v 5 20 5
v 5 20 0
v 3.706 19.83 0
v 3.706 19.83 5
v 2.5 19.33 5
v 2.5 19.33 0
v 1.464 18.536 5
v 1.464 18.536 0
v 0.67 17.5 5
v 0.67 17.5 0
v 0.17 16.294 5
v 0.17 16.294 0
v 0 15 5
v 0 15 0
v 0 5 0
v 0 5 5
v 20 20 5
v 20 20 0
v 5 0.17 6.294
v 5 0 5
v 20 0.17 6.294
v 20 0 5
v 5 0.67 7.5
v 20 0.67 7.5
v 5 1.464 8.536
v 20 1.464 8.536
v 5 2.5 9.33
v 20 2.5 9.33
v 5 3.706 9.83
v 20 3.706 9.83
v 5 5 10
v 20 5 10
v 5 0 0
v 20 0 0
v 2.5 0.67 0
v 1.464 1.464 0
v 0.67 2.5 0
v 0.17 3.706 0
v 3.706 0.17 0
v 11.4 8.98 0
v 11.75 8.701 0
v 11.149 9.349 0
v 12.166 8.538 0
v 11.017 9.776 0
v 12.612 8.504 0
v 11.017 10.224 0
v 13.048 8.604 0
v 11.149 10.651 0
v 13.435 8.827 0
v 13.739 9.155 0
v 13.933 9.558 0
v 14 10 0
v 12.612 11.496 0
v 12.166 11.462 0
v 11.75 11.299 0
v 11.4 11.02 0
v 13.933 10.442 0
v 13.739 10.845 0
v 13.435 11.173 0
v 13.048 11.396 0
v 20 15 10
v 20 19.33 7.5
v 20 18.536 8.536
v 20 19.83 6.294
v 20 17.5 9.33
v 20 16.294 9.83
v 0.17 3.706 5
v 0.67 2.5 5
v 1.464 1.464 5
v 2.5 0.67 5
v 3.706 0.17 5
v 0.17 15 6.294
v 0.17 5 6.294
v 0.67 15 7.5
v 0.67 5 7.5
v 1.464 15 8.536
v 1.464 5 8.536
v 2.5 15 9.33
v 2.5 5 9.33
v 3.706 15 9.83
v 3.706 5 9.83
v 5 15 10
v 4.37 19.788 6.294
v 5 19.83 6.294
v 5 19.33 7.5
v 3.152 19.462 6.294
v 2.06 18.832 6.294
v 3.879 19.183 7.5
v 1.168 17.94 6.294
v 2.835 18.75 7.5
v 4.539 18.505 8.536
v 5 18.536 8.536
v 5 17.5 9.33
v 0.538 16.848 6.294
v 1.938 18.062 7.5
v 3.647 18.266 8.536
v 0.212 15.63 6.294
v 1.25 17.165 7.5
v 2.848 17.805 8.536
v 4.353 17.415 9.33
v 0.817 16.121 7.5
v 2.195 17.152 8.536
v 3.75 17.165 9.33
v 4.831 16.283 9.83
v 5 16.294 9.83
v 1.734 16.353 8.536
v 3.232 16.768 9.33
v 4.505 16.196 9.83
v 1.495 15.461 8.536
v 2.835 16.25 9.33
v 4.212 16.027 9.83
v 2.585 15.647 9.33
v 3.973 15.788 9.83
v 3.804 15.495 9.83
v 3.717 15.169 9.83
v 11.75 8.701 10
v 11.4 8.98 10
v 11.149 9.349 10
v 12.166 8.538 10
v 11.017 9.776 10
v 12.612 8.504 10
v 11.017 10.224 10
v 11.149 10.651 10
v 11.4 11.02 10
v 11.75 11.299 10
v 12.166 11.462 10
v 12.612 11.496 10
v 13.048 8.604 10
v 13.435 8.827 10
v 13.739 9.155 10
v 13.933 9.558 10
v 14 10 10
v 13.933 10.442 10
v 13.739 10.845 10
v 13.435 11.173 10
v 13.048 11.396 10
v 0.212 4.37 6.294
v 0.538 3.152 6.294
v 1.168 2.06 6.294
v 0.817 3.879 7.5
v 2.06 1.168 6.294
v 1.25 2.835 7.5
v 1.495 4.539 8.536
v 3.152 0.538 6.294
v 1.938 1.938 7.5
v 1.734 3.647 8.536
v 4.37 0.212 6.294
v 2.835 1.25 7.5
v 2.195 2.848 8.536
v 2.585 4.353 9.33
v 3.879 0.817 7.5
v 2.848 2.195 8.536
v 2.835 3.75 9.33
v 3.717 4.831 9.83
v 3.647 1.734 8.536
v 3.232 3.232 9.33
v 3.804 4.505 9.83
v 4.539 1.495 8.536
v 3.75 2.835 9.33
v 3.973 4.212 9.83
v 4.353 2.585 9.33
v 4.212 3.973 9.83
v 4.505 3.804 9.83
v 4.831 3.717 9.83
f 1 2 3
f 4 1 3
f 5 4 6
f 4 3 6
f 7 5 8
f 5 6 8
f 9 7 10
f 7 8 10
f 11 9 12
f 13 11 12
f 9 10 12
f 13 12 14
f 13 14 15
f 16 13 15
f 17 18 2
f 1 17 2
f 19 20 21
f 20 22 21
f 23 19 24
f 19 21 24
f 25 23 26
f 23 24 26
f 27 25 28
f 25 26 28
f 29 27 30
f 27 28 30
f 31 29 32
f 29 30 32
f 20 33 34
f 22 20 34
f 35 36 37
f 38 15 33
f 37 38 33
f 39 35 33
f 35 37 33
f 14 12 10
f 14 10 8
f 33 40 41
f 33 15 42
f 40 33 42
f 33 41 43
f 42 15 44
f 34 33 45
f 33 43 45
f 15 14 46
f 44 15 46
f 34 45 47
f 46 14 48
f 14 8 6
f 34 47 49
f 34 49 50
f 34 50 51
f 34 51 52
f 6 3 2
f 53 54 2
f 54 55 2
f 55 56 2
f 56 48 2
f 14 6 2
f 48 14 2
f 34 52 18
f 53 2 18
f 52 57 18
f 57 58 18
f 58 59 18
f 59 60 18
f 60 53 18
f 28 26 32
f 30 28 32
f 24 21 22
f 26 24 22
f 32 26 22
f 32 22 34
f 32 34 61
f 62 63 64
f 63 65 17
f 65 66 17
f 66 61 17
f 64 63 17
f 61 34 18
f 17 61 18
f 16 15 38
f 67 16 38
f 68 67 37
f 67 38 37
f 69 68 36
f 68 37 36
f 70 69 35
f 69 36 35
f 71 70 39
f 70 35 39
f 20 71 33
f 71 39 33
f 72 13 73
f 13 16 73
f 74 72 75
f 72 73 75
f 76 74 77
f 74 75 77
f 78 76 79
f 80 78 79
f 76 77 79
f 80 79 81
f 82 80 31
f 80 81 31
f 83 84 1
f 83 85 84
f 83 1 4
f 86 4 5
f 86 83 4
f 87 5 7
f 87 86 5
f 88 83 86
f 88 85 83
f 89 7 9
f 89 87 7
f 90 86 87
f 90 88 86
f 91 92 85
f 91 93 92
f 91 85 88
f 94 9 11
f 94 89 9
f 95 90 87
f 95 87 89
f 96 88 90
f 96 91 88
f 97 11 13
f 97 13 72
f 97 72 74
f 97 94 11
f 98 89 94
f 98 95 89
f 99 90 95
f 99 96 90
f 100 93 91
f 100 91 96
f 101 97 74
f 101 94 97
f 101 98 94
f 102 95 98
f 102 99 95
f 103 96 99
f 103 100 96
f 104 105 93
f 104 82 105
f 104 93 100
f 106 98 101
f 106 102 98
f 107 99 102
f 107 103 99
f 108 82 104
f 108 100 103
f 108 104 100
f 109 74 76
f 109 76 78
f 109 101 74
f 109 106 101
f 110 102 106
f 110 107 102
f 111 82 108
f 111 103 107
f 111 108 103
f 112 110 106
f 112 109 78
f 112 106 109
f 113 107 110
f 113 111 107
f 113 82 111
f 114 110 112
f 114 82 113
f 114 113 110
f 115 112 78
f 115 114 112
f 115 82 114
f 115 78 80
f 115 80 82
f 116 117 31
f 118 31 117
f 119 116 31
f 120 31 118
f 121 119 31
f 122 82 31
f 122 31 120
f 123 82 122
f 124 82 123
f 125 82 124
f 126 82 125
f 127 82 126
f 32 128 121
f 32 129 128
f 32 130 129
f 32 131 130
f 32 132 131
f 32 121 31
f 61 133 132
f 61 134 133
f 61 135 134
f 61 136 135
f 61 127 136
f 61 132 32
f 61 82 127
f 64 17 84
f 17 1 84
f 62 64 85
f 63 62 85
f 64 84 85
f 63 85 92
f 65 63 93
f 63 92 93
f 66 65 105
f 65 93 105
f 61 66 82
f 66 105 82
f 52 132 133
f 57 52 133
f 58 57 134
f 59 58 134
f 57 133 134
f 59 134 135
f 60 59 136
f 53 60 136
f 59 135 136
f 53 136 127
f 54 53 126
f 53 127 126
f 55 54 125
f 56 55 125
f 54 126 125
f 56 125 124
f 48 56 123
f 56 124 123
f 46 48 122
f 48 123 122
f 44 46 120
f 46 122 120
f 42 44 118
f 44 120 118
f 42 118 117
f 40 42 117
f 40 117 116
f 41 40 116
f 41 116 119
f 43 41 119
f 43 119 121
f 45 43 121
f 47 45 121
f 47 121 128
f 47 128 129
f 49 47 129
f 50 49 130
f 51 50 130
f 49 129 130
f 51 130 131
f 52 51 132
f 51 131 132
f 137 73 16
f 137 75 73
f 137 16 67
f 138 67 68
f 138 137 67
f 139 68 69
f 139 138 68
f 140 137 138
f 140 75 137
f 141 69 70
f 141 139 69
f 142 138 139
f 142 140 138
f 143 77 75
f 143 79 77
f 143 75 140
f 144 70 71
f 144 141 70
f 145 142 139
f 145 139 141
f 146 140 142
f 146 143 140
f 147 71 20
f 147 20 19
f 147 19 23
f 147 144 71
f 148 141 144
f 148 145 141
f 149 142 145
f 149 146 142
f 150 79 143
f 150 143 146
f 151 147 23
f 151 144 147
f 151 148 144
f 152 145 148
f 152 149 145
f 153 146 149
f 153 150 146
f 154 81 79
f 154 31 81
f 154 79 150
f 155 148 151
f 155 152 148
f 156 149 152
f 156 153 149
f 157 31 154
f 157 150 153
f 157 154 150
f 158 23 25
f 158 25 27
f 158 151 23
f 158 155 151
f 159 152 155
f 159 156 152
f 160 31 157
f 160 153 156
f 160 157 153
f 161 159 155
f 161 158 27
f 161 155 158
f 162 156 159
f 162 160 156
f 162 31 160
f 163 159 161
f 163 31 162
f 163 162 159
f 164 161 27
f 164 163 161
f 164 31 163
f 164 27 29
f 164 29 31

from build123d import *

# Parameters (mm, degrees)
BOSS_EXTRU_1_DEPTH      = 10
CONG_1_R                = 5
ESQUISSE2_R             = 1.5
ENL_V_MAT_EXTRU_1_DEPTH = 10


with BuildPart() as part:
    # Esquisse1 → Boss.-Extru.1 (new body)
    with BuildSketch(Plane.XY):
        with BuildLine():
            Line((5, 0), (20, 0))
            Line((20, 0), (20, 20))
            Line((20, 20), (5, 20))
            ThreePointArc((5, 20), (1.464466094, 18.535533906), (0, 15))
            Line((0, 15), (0, 5))
            ThreePointArc((0, 5), (1.464466094, 1.464466094), (5, 0))
        make_face()
    extrude(amount=BOSS_EXTRU_1_DEPTH)

    # Congé1
    cong_1_edges = [part.edges().sort_by_distance(p)[0] for p in [
        (1.464466094, 18.535533906, 10),
        (0, 10, 10),
        (1.464466094, 1.464466094, 10),
        (12.5, 0, 10),
        (12.5, 20, 10),
    ]]
    fillet(cong_1_edges, radius=CONG_1_R)

    # Esquisse2 → Enlèv. mat.-Extru.1 (cut)
    with BuildSketch(Plane.XY.offset(10)):
        with Locations((12.5, 10)):
            Circle(ESQUISSE2_R)
    extrude(amount=-ENL_V_MAT_EXTRU_1_DEPTH, mode=Mode.SUBTRACT)


solid = part.part
